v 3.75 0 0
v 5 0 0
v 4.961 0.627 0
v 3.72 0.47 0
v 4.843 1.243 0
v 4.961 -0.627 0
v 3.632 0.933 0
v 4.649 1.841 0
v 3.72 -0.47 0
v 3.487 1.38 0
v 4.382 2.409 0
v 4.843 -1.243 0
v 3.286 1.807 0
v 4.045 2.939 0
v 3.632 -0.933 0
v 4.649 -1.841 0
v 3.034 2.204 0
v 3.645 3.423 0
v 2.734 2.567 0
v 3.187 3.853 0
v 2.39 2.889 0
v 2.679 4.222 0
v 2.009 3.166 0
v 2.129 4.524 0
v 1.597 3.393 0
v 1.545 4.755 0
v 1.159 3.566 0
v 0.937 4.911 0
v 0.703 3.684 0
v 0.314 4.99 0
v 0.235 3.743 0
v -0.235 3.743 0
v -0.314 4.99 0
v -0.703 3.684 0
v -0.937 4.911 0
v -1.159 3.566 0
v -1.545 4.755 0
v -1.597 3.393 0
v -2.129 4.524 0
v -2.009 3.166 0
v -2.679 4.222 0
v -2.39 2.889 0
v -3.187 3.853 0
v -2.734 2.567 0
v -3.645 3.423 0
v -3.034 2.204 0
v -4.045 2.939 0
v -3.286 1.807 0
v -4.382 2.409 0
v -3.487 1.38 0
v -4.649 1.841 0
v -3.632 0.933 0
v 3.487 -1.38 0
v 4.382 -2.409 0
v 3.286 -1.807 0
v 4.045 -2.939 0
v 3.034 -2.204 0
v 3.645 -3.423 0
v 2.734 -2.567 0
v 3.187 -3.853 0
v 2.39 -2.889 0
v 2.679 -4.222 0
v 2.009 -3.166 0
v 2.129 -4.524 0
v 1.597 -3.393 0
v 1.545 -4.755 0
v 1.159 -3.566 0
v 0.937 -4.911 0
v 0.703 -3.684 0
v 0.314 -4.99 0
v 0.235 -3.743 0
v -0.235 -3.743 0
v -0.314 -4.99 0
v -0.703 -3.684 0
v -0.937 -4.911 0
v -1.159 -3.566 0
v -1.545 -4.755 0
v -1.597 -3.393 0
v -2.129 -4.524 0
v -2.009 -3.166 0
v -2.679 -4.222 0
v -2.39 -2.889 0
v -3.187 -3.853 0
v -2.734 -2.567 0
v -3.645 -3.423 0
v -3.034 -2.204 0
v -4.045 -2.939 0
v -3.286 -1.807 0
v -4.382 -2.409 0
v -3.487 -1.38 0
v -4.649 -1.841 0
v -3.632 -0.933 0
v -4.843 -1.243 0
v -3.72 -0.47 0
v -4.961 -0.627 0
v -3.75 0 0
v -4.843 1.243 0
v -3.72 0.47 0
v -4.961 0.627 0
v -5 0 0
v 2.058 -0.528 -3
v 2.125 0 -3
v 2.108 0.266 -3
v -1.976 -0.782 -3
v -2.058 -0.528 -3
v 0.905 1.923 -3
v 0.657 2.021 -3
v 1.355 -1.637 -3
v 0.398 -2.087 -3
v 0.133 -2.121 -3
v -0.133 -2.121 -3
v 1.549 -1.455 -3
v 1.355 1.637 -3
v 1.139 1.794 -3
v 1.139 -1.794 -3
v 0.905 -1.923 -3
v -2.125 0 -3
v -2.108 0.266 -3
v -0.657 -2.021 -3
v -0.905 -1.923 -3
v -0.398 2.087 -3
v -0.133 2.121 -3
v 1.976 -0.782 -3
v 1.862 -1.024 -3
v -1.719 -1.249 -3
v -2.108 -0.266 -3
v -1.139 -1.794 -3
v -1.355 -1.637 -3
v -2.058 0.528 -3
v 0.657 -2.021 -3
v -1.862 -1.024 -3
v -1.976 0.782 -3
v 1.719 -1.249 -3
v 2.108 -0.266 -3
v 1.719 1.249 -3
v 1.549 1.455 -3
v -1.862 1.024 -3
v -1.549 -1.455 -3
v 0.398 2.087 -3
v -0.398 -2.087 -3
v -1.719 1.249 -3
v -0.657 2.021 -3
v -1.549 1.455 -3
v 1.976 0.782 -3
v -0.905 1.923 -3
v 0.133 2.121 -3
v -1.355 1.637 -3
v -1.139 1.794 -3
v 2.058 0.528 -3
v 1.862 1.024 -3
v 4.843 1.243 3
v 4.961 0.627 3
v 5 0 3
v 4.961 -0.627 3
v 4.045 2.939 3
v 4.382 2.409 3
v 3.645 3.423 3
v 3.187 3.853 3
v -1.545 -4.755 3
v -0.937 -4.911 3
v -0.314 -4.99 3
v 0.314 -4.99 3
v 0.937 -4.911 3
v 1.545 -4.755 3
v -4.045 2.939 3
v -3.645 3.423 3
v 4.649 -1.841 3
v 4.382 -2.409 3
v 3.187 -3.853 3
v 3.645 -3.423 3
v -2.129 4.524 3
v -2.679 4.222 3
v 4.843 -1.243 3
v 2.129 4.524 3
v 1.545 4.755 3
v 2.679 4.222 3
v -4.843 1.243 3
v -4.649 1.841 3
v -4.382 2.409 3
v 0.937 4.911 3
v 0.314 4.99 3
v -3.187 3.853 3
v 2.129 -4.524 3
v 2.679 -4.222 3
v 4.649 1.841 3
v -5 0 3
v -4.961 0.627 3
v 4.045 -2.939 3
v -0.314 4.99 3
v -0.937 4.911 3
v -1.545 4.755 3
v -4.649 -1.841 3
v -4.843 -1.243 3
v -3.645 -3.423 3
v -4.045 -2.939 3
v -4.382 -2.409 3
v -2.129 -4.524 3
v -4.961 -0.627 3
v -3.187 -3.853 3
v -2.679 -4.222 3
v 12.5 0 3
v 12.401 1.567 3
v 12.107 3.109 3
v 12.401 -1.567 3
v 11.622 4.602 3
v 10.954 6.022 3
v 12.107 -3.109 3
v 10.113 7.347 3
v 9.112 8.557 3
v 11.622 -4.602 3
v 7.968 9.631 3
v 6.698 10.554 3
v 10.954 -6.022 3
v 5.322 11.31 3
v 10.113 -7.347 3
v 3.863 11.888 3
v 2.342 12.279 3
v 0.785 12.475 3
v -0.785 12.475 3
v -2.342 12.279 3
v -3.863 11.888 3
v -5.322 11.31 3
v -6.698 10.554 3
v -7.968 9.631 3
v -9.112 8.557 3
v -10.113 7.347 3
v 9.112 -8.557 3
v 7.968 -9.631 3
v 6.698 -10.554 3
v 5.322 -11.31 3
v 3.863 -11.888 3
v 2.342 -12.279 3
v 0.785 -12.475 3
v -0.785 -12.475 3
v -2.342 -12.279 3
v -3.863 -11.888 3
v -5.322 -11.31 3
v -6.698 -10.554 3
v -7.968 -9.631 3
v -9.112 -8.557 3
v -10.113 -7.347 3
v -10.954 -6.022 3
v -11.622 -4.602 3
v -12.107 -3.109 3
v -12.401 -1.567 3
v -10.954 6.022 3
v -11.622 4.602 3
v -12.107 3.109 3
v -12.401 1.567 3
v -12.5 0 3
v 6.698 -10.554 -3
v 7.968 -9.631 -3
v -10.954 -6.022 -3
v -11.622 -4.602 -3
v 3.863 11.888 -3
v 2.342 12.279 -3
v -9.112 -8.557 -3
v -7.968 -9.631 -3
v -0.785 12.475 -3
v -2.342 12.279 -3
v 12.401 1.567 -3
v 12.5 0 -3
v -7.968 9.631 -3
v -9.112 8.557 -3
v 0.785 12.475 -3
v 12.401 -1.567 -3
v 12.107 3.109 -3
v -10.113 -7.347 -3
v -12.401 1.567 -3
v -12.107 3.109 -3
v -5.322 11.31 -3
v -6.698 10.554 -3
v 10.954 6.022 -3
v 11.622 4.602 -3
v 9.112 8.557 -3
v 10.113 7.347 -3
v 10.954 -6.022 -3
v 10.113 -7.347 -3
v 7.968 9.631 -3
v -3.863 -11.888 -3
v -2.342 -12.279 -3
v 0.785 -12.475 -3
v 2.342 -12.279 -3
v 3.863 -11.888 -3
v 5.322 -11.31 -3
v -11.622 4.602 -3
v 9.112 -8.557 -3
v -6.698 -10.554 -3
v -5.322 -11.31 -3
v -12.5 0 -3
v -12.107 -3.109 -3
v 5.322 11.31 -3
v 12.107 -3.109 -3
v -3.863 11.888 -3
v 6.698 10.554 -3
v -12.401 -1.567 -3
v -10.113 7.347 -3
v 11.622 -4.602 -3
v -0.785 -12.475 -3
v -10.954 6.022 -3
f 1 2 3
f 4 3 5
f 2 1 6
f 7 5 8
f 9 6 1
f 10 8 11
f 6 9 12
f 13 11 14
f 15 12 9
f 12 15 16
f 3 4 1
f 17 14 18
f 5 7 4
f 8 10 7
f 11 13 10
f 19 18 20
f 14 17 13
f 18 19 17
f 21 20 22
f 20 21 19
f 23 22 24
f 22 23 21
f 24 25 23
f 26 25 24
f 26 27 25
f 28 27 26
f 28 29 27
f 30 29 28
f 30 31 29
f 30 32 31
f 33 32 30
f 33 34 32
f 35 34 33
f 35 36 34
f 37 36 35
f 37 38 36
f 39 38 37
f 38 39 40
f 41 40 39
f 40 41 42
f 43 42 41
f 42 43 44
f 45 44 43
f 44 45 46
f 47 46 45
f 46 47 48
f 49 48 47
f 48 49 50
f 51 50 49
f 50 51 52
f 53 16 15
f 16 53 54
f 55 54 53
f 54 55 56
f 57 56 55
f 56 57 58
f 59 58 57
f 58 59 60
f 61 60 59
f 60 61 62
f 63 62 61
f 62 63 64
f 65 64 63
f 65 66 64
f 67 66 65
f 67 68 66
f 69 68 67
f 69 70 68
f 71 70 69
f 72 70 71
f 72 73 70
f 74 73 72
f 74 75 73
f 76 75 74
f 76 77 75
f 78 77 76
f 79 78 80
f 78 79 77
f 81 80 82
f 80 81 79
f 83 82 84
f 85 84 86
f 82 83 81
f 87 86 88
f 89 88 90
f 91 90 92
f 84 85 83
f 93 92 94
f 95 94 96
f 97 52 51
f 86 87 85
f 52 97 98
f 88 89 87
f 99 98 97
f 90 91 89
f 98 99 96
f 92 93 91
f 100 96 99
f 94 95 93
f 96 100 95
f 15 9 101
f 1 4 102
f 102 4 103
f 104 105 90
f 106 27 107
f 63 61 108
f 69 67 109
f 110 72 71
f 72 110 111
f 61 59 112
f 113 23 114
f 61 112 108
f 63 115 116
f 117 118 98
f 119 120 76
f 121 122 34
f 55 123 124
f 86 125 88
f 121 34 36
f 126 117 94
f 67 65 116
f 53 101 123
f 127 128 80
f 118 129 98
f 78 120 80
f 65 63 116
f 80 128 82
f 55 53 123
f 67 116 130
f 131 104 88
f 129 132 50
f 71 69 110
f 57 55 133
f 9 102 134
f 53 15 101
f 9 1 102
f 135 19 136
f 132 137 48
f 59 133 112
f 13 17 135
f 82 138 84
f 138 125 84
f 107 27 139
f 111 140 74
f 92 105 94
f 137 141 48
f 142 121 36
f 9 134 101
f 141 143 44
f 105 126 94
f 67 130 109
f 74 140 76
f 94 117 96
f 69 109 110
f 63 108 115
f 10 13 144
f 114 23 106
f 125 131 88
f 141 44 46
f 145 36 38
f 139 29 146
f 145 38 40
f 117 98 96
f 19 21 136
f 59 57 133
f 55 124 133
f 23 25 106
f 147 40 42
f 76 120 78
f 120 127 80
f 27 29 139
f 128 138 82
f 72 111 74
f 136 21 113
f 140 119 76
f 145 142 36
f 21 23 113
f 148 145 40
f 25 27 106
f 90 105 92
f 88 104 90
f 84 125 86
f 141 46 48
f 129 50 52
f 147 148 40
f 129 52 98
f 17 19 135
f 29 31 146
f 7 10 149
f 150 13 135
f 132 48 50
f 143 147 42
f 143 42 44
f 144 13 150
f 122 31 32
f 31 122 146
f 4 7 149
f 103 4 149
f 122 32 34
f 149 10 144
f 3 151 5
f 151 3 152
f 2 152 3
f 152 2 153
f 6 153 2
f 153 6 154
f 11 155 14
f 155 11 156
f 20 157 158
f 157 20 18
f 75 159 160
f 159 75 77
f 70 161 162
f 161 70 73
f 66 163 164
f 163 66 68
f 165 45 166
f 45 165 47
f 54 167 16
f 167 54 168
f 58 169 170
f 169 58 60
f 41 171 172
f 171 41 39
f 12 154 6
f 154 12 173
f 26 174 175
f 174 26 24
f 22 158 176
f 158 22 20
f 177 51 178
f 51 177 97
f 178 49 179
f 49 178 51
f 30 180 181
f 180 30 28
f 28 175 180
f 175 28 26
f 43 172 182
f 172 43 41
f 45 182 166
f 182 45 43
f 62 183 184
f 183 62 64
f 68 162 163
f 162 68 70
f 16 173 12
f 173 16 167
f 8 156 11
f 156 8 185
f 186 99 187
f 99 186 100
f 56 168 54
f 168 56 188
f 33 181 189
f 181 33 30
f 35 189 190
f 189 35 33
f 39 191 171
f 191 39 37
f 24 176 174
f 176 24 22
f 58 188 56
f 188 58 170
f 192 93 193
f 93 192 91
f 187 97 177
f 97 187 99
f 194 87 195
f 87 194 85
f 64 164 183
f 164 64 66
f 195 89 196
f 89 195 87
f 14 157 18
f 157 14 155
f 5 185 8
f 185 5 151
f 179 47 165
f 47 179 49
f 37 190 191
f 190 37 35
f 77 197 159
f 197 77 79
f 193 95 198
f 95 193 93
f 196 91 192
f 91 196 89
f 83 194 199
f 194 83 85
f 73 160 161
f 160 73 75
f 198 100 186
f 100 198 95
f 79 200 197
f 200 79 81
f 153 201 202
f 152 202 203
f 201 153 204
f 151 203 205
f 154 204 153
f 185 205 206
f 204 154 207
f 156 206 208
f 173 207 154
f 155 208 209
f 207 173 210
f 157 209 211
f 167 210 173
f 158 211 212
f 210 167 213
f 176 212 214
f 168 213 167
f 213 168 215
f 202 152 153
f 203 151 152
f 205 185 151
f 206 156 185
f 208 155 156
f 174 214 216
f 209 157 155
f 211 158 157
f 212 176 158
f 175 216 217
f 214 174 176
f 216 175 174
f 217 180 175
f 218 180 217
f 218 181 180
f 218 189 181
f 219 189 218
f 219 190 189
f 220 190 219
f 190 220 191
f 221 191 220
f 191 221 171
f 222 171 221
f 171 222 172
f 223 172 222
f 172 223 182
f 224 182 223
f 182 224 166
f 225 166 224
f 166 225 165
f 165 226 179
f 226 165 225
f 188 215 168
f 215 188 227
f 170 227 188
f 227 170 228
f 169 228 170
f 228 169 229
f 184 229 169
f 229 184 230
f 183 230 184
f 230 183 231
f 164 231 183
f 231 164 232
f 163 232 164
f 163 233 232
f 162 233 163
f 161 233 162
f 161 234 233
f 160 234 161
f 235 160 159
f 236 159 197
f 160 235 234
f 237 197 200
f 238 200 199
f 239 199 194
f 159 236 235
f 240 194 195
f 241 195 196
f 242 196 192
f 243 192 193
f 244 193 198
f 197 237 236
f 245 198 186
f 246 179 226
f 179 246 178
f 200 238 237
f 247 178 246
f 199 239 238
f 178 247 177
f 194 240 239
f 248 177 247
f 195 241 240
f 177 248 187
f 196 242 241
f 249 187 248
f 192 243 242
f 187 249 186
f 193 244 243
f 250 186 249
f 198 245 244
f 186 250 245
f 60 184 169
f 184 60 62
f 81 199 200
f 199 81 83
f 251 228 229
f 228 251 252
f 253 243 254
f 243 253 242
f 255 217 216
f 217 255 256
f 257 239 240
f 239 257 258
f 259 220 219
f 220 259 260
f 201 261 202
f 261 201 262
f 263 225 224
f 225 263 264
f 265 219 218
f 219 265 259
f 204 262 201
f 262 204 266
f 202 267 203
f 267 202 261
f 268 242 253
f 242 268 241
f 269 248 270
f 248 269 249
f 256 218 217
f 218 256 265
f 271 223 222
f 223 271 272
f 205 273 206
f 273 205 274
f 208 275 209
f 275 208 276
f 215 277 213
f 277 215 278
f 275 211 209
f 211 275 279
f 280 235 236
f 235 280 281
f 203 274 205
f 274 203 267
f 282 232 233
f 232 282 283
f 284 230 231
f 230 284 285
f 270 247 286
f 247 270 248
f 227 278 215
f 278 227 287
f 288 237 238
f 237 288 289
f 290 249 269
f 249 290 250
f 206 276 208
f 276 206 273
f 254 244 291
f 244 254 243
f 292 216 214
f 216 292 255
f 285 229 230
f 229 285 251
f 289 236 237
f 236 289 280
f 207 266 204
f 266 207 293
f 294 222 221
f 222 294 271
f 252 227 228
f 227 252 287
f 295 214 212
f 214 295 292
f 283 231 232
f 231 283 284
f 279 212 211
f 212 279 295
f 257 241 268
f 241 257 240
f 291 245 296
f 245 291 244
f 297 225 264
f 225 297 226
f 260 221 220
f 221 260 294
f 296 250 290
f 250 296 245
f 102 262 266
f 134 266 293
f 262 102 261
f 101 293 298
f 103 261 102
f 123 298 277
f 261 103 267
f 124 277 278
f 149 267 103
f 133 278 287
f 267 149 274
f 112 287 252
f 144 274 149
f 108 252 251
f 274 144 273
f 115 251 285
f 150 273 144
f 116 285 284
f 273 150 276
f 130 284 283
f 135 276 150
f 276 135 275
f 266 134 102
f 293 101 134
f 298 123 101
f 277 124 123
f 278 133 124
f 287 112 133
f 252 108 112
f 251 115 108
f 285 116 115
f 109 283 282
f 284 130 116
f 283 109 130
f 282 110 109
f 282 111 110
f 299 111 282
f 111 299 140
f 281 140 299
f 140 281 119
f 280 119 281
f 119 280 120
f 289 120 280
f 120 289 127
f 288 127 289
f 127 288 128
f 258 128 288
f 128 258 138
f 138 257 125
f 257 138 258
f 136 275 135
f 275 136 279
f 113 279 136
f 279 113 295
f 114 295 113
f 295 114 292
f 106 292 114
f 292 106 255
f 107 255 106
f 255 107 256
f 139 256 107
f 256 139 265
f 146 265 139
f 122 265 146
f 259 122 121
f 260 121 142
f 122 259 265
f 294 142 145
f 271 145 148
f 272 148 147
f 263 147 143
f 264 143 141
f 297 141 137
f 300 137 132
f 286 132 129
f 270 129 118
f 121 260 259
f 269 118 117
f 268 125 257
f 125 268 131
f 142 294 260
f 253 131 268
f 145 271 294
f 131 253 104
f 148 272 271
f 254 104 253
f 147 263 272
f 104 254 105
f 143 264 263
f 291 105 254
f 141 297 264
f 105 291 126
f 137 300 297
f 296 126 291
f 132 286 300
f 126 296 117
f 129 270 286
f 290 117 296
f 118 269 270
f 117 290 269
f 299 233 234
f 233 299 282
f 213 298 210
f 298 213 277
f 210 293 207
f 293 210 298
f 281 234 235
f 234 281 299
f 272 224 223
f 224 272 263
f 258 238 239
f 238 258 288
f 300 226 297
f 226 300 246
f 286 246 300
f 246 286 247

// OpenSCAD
$fn = 50;

difference() {
	union() {
		translate(v = [0, 0, -3.0]) {
			cylinder(h = 6, r = 12.5);
		}
	}
	union() {
		translate(v = [0, 0, 0]) {
			rotate(a = [0, 0, 0]) {
				difference() {
					union() {
						translate(v = [0, 0, -6.0]) {
							cylinder(h = 6, r = 2.0);
						}
						translate(v = [0, 0, -3]) {
							cylinder(h = 3, r1 = 2.125, r2 = 3.75);
						}
						translate(v = [0, 0, -6.0]) {
							cylinder(h = 6, r = 2.125);
						}
						translate(v = [0, 0, -6.0]) {
							cylinder(h = 6, r = 2.0);
						}
					}
					union();
				}
			}
		}
		#cylinder(h = 3, r = 5.0);
	}
}
